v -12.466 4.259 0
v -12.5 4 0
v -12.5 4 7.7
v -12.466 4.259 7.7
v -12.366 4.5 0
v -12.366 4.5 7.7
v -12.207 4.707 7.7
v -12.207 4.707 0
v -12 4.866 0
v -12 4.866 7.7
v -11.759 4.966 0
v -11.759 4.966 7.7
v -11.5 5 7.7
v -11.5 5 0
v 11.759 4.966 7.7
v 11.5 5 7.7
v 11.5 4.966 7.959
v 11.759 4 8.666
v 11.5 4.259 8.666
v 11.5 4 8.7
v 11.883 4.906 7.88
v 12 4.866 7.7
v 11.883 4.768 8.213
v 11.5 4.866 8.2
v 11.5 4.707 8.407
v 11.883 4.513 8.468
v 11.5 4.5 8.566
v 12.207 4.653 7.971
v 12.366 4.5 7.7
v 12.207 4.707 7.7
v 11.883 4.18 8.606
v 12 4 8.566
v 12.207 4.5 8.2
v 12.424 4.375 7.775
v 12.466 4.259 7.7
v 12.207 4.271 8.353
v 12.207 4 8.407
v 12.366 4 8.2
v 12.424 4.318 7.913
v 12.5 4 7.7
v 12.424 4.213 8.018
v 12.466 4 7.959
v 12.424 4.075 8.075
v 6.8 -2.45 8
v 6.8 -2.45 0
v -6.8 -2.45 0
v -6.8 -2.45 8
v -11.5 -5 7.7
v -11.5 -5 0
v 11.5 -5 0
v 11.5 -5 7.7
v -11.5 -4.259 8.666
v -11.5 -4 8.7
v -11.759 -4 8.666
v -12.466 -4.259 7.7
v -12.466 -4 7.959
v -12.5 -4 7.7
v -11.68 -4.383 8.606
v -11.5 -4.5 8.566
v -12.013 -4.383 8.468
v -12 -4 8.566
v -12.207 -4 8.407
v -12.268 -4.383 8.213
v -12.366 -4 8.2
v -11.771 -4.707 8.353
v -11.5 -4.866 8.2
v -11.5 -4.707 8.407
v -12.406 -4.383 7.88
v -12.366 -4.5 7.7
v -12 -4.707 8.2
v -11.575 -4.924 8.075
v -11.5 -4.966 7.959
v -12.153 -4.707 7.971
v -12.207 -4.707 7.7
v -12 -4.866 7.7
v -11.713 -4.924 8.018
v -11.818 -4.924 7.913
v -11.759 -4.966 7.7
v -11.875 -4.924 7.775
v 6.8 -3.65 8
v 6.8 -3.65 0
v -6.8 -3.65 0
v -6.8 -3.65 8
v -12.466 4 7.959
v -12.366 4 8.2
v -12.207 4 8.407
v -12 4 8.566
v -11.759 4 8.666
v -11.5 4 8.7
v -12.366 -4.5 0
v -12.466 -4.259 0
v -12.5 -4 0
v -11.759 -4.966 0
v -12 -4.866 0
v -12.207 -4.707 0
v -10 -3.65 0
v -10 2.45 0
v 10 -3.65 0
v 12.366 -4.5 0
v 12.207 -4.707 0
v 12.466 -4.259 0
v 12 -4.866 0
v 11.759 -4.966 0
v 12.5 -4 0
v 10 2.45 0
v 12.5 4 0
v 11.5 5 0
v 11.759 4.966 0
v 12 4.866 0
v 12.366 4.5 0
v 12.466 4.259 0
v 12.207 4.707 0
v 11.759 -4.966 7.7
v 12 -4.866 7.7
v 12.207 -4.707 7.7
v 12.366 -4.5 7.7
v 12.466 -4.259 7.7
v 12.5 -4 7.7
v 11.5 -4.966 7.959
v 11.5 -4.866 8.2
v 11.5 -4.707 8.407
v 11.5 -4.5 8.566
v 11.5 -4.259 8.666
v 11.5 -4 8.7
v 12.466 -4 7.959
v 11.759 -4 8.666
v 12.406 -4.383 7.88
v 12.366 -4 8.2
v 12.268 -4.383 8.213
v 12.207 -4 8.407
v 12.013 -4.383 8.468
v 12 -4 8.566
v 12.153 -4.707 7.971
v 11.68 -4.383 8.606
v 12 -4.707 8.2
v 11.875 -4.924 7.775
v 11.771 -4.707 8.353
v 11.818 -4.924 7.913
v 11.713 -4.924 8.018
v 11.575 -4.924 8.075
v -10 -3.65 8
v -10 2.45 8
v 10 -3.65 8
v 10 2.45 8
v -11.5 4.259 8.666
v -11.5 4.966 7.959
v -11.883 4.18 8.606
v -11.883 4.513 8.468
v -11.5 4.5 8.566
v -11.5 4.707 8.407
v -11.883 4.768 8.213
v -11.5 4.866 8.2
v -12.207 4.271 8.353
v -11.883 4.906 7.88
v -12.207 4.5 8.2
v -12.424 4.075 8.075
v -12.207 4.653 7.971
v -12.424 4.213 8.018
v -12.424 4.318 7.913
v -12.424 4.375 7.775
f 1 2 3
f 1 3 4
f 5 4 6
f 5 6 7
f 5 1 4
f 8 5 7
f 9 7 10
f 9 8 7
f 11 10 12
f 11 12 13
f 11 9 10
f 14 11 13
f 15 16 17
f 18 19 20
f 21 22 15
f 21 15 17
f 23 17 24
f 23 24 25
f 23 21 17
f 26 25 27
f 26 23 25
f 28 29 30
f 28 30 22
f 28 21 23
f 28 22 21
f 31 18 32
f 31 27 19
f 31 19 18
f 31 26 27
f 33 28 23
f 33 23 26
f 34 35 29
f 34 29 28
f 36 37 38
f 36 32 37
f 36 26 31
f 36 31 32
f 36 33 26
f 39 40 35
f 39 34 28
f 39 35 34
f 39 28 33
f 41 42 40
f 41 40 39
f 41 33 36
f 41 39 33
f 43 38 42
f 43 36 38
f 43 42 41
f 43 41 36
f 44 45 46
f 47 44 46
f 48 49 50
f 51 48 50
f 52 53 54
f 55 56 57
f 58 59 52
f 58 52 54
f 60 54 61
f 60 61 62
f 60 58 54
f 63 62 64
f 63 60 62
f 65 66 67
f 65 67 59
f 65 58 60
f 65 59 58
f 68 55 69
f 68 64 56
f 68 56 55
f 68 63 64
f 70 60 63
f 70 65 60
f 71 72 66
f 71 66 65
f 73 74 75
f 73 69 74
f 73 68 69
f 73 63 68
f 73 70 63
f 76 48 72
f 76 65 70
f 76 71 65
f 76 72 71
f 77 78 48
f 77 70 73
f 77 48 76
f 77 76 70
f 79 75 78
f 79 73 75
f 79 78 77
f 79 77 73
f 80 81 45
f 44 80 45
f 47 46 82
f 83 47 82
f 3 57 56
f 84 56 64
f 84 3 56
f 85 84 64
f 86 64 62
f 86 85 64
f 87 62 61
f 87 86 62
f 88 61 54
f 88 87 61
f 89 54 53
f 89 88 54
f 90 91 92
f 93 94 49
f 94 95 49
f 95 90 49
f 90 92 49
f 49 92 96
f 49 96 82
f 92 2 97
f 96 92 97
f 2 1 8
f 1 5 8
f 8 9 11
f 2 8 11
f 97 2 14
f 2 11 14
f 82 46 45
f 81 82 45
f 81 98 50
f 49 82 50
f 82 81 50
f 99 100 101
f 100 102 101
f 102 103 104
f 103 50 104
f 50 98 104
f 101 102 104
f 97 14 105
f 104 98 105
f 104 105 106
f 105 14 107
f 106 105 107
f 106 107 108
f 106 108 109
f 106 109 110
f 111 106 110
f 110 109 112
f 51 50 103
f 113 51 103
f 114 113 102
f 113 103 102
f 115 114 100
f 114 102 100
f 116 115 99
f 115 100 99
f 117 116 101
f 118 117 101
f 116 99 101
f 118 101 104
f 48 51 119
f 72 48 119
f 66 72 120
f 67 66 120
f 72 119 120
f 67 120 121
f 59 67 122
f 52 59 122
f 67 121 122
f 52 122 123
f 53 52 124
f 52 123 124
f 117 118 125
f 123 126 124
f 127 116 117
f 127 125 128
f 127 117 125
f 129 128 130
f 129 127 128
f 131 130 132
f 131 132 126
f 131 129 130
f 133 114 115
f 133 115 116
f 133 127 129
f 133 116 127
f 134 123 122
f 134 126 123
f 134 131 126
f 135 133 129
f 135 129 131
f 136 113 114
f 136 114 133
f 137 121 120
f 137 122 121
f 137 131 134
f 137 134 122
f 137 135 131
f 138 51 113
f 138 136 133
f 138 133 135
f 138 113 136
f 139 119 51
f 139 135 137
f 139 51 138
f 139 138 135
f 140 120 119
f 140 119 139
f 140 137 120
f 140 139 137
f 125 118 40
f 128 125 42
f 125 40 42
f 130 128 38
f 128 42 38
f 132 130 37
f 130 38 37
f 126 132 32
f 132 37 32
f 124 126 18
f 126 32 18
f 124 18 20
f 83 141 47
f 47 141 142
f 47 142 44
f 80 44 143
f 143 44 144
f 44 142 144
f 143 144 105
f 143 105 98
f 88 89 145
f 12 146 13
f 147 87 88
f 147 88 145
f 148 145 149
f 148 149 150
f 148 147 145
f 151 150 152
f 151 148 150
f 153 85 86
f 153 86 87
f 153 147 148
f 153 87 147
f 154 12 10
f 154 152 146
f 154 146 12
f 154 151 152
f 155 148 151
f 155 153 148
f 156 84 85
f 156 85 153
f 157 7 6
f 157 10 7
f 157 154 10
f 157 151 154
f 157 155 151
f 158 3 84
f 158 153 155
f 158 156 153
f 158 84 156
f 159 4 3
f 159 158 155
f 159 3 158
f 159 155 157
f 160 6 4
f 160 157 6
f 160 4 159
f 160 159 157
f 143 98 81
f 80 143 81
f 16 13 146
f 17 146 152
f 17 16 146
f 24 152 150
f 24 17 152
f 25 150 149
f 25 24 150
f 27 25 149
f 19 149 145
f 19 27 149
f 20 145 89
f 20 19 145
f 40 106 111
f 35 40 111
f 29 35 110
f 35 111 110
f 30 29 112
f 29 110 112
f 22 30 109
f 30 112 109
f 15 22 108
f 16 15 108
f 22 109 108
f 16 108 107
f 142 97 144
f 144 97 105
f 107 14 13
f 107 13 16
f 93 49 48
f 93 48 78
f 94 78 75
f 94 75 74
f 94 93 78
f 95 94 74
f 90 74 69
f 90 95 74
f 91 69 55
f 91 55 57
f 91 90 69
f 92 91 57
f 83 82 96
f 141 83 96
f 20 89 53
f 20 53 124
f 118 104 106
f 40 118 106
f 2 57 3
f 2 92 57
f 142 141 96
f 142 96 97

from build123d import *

# Parameters (mm, degrees)
F0_W         = 25
F0_H         = 10
F1_DEPTH     = 8
F2_W         = 25
F2_H         = 10
F3_DEPTH     = 0.7
F4_R         = 1
F5_T1_DEPTH  = 10.2
F5_S5_W      = 1
F5_S5_H      = 1
F5_T6_DEPTH  = 1
F6_T1_DEPTH  = 10.2
F6_S5_W      = 1
F6_S5_H      = 1
F6_T6_DEPTH  = 1
F6_S11_W     = 1
F6_S11_H     = 1
F6_T12_DEPTH = 1
F6_S17_W     = 1
F6_S17_H     = 1
F6_T18_DEPTH = 1


# Not quite as in the source:
# - a fillet or chamfer that OpenCascade refuses, or shapes differently, is made with other operations: its cross-section is extruded or revolved along the edge and cut away or added


with BuildPart() as f1:
    # F0 (on Top) → F1 (new body)
    with BuildSketch(Plane.XY):
        Rectangle(F0_W, F0_H)
        Polygon((-10, 2.45), (10, 2.45), (10, -2.45), (10, -3.65), (6.8, -3.65), (6.8, -2.45), (-6.8, -2.45), (-6.8, -3.65), (-10, -3.65), (-10, -2.45), align=None, mode=Mode.SUBTRACT)
    extrude(amount=F1_DEPTH)

    # F2 (on face) → F3 (join)
    with BuildSketch(Plane.XY.offset(8)):
        Rectangle(F2_W, F2_H)
    extrude(amount=F3_DEPTH)

    # F4
    f4_edges = [f1.edges().sort_by_distance(p)[0] for p in [
        (0, 5, 8.7),
        (-12.5, 0, 8.7),
        (0, -5, 8.7),
        (12.5, 0, 8.7),
    ]]
    fillet(f4_edges, radius=F4_R)

    # F5: fillet of radius 1 on 1 edges, made by hand

    # F5_s2 → F5_t1 (cut)
    with BuildSketch(Plane.XY.offset(-2.5)):
        with BuildLine():
            ThreePointArc((12.5, 4), (12.2071067812, 4.7071067812), (11.5, 5))
            Line((11.5, 5), (12.5, 5))
            Line((12.5, 5), (12.5, 4))
        make_face()
    extrude(amount=F5_T1_DEPTH, mode=Mode.SUBTRACT)


with BuildPart() as f5_tool4:
    # F5_s5 → F5_t6 (new body)
    with BuildSketch(Plane.YZ.offset(11.5)):
        with Locations((4.5, 8.2)):
            Rectangle(F5_S5_W, F5_S5_H)
    extrude(amount=F5_T6_DEPTH)

    # F5_s7 → F5_t8 (revolve, cut)
    with BuildSketch(Plane(origin=(11.5, 4, 7.7), x_dir=(0, -0.7071067812, -0.7071067812), z_dir=(0, -0.7071067812, 0.7071067812))):
        with BuildLine():
            ThreePointArc((0, -1), (1, 0), (0, 1))
            Line((0, 1), (0, -1))
        make_face()
    revolve(axis=Axis((11.5, 4, 7.7), (1, 0, 0)), mode=Mode.SUBTRACT)


with BuildPart() as f1_1:
    add(f1.part)

    # F5_t3: cut F5_tool4
    add(f5_tool4.part, mode=Mode.SUBTRACT)

    # F6: fillet of radius 1 on 3 edges, made by hand

    # F6_s2 → F6_t1 (cut)
    with BuildSketch(Plane.XY.offset(-2.5)):
        with BuildLine():
            ThreePointArc((-12.5, 4), (-12.2071067812, 4.7071067812), (-11.5, 5))
            Line((-11.5, 5), (-12.5, 5))
            Line((-12.5, 5), (-12.5, 4))
        make_face()
        with BuildLine():
            ThreePointArc((11.5, -5), (12.2071067812, -4.7071067812), (12.5, -4))
            Line((12.5, -4), (12.5, -5))
            Line((12.5, -5), (11.5, -5))
        make_face()
        with BuildLine():
            ThreePointArc((-11.5, -5), (-12.2071067812, -4.7071067812), (-12.5, -4))
            Line((-12.5, -4), (-12.5, -5))
            Line((-12.5, -5), (-11.5, -5))
        make_face()
    extrude(amount=F6_T1_DEPTH, mode=Mode.SUBTRACT)


with BuildPart() as f6_tool4:
    # F6_s5 → F6_t6 (new body)
    with BuildSketch(Plane.XZ.offset(4)):
        with Locations((-12, 8.2)):
            Rectangle(F6_S5_W, F6_S5_H)
    extrude(amount=F6_T6_DEPTH)

    # F6_s7 → F6_t8 (revolve, cut)
    with BuildSketch(Plane(origin=(-11.5, -4, 7.7), x_dir=(0.7071067812, 0, -0.7071067812), z_dir=(-0.7071067812, 0, -0.7071067812))):
        with BuildLine():
            ThreePointArc((0, -1), (1, 0), (0, 1))
            Line((0, 1), (0, -1))
        make_face()
    revolve(axis=Axis((-11.5, -4, 7.7), (0, -1, 0)), mode=Mode.SUBTRACT)


with BuildPart() as f1_2:
    add(f1_1.part)

    # F6_t3: cut F6_tool4
    add(f6_tool4.part, mode=Mode.SUBTRACT)


with BuildPart() as f6_tool10:
    # F6_s11 → F6_t12 (new body)
    with BuildSketch(Plane.XZ.offset(4)):
        with Locations((12, 8.2)):
            Rectangle(F6_S11_W, F6_S11_H)
    extrude(amount=F6_T12_DEPTH)

    # F6_s13 → F6_t14 (revolve, cut)
    with BuildSketch(Plane(origin=(11.5, -4, 7.7), x_dir=(-0.7071067812, 0, -0.7071067812), z_dir=(-0.7071067812, 0, 0.7071067812))):
        with BuildLine():
            ThreePointArc((0, -1), (1, 0), (0, 1))
            Line((0, 1), (0, -1))
        make_face()
    revolve(axis=Axis((11.5, -4, 7.7), (0, -1, 0)), mode=Mode.SUBTRACT)


with BuildPart() as f1_3:
    add(f1_2.part)

    # F6_t9: cut F6_tool10
    add(f6_tool10.part, mode=Mode.SUBTRACT)


with BuildPart() as f6_tool16:
    # F6_s17 → F6_t18 (new body)
    with BuildSketch(Plane.YZ.offset(-11.5)):
        with Locations((4.5, 8.2)):
            Rectangle(F6_S17_W, F6_S17_H)
    extrude(amount=-F6_T18_DEPTH)

    # F6_s19 → F6_t20 (revolve, cut)
    with BuildSketch(Plane(origin=(-11.5, 4, 7.7), x_dir=(0, -0.7071067812, -0.7071067812), z_dir=(0, 0.7071067812, -0.7071067812))):
        with BuildLine():
            ThreePointArc((0, -1), (1, 0), (0, 1))
            Line((0, 1), (0, -1))
        make_face()
    revolve(axis=Axis((-11.5, 4, 7.7), (-1, 0, 0)), mode=Mode.SUBTRACT)


with BuildPart() as f1_4:
    add(f1_3.part)

    # F6_t15: cut F6_tool16
    add(f6_tool16.part, mode=Mode.SUBTRACT)


solid = f1_4.part
